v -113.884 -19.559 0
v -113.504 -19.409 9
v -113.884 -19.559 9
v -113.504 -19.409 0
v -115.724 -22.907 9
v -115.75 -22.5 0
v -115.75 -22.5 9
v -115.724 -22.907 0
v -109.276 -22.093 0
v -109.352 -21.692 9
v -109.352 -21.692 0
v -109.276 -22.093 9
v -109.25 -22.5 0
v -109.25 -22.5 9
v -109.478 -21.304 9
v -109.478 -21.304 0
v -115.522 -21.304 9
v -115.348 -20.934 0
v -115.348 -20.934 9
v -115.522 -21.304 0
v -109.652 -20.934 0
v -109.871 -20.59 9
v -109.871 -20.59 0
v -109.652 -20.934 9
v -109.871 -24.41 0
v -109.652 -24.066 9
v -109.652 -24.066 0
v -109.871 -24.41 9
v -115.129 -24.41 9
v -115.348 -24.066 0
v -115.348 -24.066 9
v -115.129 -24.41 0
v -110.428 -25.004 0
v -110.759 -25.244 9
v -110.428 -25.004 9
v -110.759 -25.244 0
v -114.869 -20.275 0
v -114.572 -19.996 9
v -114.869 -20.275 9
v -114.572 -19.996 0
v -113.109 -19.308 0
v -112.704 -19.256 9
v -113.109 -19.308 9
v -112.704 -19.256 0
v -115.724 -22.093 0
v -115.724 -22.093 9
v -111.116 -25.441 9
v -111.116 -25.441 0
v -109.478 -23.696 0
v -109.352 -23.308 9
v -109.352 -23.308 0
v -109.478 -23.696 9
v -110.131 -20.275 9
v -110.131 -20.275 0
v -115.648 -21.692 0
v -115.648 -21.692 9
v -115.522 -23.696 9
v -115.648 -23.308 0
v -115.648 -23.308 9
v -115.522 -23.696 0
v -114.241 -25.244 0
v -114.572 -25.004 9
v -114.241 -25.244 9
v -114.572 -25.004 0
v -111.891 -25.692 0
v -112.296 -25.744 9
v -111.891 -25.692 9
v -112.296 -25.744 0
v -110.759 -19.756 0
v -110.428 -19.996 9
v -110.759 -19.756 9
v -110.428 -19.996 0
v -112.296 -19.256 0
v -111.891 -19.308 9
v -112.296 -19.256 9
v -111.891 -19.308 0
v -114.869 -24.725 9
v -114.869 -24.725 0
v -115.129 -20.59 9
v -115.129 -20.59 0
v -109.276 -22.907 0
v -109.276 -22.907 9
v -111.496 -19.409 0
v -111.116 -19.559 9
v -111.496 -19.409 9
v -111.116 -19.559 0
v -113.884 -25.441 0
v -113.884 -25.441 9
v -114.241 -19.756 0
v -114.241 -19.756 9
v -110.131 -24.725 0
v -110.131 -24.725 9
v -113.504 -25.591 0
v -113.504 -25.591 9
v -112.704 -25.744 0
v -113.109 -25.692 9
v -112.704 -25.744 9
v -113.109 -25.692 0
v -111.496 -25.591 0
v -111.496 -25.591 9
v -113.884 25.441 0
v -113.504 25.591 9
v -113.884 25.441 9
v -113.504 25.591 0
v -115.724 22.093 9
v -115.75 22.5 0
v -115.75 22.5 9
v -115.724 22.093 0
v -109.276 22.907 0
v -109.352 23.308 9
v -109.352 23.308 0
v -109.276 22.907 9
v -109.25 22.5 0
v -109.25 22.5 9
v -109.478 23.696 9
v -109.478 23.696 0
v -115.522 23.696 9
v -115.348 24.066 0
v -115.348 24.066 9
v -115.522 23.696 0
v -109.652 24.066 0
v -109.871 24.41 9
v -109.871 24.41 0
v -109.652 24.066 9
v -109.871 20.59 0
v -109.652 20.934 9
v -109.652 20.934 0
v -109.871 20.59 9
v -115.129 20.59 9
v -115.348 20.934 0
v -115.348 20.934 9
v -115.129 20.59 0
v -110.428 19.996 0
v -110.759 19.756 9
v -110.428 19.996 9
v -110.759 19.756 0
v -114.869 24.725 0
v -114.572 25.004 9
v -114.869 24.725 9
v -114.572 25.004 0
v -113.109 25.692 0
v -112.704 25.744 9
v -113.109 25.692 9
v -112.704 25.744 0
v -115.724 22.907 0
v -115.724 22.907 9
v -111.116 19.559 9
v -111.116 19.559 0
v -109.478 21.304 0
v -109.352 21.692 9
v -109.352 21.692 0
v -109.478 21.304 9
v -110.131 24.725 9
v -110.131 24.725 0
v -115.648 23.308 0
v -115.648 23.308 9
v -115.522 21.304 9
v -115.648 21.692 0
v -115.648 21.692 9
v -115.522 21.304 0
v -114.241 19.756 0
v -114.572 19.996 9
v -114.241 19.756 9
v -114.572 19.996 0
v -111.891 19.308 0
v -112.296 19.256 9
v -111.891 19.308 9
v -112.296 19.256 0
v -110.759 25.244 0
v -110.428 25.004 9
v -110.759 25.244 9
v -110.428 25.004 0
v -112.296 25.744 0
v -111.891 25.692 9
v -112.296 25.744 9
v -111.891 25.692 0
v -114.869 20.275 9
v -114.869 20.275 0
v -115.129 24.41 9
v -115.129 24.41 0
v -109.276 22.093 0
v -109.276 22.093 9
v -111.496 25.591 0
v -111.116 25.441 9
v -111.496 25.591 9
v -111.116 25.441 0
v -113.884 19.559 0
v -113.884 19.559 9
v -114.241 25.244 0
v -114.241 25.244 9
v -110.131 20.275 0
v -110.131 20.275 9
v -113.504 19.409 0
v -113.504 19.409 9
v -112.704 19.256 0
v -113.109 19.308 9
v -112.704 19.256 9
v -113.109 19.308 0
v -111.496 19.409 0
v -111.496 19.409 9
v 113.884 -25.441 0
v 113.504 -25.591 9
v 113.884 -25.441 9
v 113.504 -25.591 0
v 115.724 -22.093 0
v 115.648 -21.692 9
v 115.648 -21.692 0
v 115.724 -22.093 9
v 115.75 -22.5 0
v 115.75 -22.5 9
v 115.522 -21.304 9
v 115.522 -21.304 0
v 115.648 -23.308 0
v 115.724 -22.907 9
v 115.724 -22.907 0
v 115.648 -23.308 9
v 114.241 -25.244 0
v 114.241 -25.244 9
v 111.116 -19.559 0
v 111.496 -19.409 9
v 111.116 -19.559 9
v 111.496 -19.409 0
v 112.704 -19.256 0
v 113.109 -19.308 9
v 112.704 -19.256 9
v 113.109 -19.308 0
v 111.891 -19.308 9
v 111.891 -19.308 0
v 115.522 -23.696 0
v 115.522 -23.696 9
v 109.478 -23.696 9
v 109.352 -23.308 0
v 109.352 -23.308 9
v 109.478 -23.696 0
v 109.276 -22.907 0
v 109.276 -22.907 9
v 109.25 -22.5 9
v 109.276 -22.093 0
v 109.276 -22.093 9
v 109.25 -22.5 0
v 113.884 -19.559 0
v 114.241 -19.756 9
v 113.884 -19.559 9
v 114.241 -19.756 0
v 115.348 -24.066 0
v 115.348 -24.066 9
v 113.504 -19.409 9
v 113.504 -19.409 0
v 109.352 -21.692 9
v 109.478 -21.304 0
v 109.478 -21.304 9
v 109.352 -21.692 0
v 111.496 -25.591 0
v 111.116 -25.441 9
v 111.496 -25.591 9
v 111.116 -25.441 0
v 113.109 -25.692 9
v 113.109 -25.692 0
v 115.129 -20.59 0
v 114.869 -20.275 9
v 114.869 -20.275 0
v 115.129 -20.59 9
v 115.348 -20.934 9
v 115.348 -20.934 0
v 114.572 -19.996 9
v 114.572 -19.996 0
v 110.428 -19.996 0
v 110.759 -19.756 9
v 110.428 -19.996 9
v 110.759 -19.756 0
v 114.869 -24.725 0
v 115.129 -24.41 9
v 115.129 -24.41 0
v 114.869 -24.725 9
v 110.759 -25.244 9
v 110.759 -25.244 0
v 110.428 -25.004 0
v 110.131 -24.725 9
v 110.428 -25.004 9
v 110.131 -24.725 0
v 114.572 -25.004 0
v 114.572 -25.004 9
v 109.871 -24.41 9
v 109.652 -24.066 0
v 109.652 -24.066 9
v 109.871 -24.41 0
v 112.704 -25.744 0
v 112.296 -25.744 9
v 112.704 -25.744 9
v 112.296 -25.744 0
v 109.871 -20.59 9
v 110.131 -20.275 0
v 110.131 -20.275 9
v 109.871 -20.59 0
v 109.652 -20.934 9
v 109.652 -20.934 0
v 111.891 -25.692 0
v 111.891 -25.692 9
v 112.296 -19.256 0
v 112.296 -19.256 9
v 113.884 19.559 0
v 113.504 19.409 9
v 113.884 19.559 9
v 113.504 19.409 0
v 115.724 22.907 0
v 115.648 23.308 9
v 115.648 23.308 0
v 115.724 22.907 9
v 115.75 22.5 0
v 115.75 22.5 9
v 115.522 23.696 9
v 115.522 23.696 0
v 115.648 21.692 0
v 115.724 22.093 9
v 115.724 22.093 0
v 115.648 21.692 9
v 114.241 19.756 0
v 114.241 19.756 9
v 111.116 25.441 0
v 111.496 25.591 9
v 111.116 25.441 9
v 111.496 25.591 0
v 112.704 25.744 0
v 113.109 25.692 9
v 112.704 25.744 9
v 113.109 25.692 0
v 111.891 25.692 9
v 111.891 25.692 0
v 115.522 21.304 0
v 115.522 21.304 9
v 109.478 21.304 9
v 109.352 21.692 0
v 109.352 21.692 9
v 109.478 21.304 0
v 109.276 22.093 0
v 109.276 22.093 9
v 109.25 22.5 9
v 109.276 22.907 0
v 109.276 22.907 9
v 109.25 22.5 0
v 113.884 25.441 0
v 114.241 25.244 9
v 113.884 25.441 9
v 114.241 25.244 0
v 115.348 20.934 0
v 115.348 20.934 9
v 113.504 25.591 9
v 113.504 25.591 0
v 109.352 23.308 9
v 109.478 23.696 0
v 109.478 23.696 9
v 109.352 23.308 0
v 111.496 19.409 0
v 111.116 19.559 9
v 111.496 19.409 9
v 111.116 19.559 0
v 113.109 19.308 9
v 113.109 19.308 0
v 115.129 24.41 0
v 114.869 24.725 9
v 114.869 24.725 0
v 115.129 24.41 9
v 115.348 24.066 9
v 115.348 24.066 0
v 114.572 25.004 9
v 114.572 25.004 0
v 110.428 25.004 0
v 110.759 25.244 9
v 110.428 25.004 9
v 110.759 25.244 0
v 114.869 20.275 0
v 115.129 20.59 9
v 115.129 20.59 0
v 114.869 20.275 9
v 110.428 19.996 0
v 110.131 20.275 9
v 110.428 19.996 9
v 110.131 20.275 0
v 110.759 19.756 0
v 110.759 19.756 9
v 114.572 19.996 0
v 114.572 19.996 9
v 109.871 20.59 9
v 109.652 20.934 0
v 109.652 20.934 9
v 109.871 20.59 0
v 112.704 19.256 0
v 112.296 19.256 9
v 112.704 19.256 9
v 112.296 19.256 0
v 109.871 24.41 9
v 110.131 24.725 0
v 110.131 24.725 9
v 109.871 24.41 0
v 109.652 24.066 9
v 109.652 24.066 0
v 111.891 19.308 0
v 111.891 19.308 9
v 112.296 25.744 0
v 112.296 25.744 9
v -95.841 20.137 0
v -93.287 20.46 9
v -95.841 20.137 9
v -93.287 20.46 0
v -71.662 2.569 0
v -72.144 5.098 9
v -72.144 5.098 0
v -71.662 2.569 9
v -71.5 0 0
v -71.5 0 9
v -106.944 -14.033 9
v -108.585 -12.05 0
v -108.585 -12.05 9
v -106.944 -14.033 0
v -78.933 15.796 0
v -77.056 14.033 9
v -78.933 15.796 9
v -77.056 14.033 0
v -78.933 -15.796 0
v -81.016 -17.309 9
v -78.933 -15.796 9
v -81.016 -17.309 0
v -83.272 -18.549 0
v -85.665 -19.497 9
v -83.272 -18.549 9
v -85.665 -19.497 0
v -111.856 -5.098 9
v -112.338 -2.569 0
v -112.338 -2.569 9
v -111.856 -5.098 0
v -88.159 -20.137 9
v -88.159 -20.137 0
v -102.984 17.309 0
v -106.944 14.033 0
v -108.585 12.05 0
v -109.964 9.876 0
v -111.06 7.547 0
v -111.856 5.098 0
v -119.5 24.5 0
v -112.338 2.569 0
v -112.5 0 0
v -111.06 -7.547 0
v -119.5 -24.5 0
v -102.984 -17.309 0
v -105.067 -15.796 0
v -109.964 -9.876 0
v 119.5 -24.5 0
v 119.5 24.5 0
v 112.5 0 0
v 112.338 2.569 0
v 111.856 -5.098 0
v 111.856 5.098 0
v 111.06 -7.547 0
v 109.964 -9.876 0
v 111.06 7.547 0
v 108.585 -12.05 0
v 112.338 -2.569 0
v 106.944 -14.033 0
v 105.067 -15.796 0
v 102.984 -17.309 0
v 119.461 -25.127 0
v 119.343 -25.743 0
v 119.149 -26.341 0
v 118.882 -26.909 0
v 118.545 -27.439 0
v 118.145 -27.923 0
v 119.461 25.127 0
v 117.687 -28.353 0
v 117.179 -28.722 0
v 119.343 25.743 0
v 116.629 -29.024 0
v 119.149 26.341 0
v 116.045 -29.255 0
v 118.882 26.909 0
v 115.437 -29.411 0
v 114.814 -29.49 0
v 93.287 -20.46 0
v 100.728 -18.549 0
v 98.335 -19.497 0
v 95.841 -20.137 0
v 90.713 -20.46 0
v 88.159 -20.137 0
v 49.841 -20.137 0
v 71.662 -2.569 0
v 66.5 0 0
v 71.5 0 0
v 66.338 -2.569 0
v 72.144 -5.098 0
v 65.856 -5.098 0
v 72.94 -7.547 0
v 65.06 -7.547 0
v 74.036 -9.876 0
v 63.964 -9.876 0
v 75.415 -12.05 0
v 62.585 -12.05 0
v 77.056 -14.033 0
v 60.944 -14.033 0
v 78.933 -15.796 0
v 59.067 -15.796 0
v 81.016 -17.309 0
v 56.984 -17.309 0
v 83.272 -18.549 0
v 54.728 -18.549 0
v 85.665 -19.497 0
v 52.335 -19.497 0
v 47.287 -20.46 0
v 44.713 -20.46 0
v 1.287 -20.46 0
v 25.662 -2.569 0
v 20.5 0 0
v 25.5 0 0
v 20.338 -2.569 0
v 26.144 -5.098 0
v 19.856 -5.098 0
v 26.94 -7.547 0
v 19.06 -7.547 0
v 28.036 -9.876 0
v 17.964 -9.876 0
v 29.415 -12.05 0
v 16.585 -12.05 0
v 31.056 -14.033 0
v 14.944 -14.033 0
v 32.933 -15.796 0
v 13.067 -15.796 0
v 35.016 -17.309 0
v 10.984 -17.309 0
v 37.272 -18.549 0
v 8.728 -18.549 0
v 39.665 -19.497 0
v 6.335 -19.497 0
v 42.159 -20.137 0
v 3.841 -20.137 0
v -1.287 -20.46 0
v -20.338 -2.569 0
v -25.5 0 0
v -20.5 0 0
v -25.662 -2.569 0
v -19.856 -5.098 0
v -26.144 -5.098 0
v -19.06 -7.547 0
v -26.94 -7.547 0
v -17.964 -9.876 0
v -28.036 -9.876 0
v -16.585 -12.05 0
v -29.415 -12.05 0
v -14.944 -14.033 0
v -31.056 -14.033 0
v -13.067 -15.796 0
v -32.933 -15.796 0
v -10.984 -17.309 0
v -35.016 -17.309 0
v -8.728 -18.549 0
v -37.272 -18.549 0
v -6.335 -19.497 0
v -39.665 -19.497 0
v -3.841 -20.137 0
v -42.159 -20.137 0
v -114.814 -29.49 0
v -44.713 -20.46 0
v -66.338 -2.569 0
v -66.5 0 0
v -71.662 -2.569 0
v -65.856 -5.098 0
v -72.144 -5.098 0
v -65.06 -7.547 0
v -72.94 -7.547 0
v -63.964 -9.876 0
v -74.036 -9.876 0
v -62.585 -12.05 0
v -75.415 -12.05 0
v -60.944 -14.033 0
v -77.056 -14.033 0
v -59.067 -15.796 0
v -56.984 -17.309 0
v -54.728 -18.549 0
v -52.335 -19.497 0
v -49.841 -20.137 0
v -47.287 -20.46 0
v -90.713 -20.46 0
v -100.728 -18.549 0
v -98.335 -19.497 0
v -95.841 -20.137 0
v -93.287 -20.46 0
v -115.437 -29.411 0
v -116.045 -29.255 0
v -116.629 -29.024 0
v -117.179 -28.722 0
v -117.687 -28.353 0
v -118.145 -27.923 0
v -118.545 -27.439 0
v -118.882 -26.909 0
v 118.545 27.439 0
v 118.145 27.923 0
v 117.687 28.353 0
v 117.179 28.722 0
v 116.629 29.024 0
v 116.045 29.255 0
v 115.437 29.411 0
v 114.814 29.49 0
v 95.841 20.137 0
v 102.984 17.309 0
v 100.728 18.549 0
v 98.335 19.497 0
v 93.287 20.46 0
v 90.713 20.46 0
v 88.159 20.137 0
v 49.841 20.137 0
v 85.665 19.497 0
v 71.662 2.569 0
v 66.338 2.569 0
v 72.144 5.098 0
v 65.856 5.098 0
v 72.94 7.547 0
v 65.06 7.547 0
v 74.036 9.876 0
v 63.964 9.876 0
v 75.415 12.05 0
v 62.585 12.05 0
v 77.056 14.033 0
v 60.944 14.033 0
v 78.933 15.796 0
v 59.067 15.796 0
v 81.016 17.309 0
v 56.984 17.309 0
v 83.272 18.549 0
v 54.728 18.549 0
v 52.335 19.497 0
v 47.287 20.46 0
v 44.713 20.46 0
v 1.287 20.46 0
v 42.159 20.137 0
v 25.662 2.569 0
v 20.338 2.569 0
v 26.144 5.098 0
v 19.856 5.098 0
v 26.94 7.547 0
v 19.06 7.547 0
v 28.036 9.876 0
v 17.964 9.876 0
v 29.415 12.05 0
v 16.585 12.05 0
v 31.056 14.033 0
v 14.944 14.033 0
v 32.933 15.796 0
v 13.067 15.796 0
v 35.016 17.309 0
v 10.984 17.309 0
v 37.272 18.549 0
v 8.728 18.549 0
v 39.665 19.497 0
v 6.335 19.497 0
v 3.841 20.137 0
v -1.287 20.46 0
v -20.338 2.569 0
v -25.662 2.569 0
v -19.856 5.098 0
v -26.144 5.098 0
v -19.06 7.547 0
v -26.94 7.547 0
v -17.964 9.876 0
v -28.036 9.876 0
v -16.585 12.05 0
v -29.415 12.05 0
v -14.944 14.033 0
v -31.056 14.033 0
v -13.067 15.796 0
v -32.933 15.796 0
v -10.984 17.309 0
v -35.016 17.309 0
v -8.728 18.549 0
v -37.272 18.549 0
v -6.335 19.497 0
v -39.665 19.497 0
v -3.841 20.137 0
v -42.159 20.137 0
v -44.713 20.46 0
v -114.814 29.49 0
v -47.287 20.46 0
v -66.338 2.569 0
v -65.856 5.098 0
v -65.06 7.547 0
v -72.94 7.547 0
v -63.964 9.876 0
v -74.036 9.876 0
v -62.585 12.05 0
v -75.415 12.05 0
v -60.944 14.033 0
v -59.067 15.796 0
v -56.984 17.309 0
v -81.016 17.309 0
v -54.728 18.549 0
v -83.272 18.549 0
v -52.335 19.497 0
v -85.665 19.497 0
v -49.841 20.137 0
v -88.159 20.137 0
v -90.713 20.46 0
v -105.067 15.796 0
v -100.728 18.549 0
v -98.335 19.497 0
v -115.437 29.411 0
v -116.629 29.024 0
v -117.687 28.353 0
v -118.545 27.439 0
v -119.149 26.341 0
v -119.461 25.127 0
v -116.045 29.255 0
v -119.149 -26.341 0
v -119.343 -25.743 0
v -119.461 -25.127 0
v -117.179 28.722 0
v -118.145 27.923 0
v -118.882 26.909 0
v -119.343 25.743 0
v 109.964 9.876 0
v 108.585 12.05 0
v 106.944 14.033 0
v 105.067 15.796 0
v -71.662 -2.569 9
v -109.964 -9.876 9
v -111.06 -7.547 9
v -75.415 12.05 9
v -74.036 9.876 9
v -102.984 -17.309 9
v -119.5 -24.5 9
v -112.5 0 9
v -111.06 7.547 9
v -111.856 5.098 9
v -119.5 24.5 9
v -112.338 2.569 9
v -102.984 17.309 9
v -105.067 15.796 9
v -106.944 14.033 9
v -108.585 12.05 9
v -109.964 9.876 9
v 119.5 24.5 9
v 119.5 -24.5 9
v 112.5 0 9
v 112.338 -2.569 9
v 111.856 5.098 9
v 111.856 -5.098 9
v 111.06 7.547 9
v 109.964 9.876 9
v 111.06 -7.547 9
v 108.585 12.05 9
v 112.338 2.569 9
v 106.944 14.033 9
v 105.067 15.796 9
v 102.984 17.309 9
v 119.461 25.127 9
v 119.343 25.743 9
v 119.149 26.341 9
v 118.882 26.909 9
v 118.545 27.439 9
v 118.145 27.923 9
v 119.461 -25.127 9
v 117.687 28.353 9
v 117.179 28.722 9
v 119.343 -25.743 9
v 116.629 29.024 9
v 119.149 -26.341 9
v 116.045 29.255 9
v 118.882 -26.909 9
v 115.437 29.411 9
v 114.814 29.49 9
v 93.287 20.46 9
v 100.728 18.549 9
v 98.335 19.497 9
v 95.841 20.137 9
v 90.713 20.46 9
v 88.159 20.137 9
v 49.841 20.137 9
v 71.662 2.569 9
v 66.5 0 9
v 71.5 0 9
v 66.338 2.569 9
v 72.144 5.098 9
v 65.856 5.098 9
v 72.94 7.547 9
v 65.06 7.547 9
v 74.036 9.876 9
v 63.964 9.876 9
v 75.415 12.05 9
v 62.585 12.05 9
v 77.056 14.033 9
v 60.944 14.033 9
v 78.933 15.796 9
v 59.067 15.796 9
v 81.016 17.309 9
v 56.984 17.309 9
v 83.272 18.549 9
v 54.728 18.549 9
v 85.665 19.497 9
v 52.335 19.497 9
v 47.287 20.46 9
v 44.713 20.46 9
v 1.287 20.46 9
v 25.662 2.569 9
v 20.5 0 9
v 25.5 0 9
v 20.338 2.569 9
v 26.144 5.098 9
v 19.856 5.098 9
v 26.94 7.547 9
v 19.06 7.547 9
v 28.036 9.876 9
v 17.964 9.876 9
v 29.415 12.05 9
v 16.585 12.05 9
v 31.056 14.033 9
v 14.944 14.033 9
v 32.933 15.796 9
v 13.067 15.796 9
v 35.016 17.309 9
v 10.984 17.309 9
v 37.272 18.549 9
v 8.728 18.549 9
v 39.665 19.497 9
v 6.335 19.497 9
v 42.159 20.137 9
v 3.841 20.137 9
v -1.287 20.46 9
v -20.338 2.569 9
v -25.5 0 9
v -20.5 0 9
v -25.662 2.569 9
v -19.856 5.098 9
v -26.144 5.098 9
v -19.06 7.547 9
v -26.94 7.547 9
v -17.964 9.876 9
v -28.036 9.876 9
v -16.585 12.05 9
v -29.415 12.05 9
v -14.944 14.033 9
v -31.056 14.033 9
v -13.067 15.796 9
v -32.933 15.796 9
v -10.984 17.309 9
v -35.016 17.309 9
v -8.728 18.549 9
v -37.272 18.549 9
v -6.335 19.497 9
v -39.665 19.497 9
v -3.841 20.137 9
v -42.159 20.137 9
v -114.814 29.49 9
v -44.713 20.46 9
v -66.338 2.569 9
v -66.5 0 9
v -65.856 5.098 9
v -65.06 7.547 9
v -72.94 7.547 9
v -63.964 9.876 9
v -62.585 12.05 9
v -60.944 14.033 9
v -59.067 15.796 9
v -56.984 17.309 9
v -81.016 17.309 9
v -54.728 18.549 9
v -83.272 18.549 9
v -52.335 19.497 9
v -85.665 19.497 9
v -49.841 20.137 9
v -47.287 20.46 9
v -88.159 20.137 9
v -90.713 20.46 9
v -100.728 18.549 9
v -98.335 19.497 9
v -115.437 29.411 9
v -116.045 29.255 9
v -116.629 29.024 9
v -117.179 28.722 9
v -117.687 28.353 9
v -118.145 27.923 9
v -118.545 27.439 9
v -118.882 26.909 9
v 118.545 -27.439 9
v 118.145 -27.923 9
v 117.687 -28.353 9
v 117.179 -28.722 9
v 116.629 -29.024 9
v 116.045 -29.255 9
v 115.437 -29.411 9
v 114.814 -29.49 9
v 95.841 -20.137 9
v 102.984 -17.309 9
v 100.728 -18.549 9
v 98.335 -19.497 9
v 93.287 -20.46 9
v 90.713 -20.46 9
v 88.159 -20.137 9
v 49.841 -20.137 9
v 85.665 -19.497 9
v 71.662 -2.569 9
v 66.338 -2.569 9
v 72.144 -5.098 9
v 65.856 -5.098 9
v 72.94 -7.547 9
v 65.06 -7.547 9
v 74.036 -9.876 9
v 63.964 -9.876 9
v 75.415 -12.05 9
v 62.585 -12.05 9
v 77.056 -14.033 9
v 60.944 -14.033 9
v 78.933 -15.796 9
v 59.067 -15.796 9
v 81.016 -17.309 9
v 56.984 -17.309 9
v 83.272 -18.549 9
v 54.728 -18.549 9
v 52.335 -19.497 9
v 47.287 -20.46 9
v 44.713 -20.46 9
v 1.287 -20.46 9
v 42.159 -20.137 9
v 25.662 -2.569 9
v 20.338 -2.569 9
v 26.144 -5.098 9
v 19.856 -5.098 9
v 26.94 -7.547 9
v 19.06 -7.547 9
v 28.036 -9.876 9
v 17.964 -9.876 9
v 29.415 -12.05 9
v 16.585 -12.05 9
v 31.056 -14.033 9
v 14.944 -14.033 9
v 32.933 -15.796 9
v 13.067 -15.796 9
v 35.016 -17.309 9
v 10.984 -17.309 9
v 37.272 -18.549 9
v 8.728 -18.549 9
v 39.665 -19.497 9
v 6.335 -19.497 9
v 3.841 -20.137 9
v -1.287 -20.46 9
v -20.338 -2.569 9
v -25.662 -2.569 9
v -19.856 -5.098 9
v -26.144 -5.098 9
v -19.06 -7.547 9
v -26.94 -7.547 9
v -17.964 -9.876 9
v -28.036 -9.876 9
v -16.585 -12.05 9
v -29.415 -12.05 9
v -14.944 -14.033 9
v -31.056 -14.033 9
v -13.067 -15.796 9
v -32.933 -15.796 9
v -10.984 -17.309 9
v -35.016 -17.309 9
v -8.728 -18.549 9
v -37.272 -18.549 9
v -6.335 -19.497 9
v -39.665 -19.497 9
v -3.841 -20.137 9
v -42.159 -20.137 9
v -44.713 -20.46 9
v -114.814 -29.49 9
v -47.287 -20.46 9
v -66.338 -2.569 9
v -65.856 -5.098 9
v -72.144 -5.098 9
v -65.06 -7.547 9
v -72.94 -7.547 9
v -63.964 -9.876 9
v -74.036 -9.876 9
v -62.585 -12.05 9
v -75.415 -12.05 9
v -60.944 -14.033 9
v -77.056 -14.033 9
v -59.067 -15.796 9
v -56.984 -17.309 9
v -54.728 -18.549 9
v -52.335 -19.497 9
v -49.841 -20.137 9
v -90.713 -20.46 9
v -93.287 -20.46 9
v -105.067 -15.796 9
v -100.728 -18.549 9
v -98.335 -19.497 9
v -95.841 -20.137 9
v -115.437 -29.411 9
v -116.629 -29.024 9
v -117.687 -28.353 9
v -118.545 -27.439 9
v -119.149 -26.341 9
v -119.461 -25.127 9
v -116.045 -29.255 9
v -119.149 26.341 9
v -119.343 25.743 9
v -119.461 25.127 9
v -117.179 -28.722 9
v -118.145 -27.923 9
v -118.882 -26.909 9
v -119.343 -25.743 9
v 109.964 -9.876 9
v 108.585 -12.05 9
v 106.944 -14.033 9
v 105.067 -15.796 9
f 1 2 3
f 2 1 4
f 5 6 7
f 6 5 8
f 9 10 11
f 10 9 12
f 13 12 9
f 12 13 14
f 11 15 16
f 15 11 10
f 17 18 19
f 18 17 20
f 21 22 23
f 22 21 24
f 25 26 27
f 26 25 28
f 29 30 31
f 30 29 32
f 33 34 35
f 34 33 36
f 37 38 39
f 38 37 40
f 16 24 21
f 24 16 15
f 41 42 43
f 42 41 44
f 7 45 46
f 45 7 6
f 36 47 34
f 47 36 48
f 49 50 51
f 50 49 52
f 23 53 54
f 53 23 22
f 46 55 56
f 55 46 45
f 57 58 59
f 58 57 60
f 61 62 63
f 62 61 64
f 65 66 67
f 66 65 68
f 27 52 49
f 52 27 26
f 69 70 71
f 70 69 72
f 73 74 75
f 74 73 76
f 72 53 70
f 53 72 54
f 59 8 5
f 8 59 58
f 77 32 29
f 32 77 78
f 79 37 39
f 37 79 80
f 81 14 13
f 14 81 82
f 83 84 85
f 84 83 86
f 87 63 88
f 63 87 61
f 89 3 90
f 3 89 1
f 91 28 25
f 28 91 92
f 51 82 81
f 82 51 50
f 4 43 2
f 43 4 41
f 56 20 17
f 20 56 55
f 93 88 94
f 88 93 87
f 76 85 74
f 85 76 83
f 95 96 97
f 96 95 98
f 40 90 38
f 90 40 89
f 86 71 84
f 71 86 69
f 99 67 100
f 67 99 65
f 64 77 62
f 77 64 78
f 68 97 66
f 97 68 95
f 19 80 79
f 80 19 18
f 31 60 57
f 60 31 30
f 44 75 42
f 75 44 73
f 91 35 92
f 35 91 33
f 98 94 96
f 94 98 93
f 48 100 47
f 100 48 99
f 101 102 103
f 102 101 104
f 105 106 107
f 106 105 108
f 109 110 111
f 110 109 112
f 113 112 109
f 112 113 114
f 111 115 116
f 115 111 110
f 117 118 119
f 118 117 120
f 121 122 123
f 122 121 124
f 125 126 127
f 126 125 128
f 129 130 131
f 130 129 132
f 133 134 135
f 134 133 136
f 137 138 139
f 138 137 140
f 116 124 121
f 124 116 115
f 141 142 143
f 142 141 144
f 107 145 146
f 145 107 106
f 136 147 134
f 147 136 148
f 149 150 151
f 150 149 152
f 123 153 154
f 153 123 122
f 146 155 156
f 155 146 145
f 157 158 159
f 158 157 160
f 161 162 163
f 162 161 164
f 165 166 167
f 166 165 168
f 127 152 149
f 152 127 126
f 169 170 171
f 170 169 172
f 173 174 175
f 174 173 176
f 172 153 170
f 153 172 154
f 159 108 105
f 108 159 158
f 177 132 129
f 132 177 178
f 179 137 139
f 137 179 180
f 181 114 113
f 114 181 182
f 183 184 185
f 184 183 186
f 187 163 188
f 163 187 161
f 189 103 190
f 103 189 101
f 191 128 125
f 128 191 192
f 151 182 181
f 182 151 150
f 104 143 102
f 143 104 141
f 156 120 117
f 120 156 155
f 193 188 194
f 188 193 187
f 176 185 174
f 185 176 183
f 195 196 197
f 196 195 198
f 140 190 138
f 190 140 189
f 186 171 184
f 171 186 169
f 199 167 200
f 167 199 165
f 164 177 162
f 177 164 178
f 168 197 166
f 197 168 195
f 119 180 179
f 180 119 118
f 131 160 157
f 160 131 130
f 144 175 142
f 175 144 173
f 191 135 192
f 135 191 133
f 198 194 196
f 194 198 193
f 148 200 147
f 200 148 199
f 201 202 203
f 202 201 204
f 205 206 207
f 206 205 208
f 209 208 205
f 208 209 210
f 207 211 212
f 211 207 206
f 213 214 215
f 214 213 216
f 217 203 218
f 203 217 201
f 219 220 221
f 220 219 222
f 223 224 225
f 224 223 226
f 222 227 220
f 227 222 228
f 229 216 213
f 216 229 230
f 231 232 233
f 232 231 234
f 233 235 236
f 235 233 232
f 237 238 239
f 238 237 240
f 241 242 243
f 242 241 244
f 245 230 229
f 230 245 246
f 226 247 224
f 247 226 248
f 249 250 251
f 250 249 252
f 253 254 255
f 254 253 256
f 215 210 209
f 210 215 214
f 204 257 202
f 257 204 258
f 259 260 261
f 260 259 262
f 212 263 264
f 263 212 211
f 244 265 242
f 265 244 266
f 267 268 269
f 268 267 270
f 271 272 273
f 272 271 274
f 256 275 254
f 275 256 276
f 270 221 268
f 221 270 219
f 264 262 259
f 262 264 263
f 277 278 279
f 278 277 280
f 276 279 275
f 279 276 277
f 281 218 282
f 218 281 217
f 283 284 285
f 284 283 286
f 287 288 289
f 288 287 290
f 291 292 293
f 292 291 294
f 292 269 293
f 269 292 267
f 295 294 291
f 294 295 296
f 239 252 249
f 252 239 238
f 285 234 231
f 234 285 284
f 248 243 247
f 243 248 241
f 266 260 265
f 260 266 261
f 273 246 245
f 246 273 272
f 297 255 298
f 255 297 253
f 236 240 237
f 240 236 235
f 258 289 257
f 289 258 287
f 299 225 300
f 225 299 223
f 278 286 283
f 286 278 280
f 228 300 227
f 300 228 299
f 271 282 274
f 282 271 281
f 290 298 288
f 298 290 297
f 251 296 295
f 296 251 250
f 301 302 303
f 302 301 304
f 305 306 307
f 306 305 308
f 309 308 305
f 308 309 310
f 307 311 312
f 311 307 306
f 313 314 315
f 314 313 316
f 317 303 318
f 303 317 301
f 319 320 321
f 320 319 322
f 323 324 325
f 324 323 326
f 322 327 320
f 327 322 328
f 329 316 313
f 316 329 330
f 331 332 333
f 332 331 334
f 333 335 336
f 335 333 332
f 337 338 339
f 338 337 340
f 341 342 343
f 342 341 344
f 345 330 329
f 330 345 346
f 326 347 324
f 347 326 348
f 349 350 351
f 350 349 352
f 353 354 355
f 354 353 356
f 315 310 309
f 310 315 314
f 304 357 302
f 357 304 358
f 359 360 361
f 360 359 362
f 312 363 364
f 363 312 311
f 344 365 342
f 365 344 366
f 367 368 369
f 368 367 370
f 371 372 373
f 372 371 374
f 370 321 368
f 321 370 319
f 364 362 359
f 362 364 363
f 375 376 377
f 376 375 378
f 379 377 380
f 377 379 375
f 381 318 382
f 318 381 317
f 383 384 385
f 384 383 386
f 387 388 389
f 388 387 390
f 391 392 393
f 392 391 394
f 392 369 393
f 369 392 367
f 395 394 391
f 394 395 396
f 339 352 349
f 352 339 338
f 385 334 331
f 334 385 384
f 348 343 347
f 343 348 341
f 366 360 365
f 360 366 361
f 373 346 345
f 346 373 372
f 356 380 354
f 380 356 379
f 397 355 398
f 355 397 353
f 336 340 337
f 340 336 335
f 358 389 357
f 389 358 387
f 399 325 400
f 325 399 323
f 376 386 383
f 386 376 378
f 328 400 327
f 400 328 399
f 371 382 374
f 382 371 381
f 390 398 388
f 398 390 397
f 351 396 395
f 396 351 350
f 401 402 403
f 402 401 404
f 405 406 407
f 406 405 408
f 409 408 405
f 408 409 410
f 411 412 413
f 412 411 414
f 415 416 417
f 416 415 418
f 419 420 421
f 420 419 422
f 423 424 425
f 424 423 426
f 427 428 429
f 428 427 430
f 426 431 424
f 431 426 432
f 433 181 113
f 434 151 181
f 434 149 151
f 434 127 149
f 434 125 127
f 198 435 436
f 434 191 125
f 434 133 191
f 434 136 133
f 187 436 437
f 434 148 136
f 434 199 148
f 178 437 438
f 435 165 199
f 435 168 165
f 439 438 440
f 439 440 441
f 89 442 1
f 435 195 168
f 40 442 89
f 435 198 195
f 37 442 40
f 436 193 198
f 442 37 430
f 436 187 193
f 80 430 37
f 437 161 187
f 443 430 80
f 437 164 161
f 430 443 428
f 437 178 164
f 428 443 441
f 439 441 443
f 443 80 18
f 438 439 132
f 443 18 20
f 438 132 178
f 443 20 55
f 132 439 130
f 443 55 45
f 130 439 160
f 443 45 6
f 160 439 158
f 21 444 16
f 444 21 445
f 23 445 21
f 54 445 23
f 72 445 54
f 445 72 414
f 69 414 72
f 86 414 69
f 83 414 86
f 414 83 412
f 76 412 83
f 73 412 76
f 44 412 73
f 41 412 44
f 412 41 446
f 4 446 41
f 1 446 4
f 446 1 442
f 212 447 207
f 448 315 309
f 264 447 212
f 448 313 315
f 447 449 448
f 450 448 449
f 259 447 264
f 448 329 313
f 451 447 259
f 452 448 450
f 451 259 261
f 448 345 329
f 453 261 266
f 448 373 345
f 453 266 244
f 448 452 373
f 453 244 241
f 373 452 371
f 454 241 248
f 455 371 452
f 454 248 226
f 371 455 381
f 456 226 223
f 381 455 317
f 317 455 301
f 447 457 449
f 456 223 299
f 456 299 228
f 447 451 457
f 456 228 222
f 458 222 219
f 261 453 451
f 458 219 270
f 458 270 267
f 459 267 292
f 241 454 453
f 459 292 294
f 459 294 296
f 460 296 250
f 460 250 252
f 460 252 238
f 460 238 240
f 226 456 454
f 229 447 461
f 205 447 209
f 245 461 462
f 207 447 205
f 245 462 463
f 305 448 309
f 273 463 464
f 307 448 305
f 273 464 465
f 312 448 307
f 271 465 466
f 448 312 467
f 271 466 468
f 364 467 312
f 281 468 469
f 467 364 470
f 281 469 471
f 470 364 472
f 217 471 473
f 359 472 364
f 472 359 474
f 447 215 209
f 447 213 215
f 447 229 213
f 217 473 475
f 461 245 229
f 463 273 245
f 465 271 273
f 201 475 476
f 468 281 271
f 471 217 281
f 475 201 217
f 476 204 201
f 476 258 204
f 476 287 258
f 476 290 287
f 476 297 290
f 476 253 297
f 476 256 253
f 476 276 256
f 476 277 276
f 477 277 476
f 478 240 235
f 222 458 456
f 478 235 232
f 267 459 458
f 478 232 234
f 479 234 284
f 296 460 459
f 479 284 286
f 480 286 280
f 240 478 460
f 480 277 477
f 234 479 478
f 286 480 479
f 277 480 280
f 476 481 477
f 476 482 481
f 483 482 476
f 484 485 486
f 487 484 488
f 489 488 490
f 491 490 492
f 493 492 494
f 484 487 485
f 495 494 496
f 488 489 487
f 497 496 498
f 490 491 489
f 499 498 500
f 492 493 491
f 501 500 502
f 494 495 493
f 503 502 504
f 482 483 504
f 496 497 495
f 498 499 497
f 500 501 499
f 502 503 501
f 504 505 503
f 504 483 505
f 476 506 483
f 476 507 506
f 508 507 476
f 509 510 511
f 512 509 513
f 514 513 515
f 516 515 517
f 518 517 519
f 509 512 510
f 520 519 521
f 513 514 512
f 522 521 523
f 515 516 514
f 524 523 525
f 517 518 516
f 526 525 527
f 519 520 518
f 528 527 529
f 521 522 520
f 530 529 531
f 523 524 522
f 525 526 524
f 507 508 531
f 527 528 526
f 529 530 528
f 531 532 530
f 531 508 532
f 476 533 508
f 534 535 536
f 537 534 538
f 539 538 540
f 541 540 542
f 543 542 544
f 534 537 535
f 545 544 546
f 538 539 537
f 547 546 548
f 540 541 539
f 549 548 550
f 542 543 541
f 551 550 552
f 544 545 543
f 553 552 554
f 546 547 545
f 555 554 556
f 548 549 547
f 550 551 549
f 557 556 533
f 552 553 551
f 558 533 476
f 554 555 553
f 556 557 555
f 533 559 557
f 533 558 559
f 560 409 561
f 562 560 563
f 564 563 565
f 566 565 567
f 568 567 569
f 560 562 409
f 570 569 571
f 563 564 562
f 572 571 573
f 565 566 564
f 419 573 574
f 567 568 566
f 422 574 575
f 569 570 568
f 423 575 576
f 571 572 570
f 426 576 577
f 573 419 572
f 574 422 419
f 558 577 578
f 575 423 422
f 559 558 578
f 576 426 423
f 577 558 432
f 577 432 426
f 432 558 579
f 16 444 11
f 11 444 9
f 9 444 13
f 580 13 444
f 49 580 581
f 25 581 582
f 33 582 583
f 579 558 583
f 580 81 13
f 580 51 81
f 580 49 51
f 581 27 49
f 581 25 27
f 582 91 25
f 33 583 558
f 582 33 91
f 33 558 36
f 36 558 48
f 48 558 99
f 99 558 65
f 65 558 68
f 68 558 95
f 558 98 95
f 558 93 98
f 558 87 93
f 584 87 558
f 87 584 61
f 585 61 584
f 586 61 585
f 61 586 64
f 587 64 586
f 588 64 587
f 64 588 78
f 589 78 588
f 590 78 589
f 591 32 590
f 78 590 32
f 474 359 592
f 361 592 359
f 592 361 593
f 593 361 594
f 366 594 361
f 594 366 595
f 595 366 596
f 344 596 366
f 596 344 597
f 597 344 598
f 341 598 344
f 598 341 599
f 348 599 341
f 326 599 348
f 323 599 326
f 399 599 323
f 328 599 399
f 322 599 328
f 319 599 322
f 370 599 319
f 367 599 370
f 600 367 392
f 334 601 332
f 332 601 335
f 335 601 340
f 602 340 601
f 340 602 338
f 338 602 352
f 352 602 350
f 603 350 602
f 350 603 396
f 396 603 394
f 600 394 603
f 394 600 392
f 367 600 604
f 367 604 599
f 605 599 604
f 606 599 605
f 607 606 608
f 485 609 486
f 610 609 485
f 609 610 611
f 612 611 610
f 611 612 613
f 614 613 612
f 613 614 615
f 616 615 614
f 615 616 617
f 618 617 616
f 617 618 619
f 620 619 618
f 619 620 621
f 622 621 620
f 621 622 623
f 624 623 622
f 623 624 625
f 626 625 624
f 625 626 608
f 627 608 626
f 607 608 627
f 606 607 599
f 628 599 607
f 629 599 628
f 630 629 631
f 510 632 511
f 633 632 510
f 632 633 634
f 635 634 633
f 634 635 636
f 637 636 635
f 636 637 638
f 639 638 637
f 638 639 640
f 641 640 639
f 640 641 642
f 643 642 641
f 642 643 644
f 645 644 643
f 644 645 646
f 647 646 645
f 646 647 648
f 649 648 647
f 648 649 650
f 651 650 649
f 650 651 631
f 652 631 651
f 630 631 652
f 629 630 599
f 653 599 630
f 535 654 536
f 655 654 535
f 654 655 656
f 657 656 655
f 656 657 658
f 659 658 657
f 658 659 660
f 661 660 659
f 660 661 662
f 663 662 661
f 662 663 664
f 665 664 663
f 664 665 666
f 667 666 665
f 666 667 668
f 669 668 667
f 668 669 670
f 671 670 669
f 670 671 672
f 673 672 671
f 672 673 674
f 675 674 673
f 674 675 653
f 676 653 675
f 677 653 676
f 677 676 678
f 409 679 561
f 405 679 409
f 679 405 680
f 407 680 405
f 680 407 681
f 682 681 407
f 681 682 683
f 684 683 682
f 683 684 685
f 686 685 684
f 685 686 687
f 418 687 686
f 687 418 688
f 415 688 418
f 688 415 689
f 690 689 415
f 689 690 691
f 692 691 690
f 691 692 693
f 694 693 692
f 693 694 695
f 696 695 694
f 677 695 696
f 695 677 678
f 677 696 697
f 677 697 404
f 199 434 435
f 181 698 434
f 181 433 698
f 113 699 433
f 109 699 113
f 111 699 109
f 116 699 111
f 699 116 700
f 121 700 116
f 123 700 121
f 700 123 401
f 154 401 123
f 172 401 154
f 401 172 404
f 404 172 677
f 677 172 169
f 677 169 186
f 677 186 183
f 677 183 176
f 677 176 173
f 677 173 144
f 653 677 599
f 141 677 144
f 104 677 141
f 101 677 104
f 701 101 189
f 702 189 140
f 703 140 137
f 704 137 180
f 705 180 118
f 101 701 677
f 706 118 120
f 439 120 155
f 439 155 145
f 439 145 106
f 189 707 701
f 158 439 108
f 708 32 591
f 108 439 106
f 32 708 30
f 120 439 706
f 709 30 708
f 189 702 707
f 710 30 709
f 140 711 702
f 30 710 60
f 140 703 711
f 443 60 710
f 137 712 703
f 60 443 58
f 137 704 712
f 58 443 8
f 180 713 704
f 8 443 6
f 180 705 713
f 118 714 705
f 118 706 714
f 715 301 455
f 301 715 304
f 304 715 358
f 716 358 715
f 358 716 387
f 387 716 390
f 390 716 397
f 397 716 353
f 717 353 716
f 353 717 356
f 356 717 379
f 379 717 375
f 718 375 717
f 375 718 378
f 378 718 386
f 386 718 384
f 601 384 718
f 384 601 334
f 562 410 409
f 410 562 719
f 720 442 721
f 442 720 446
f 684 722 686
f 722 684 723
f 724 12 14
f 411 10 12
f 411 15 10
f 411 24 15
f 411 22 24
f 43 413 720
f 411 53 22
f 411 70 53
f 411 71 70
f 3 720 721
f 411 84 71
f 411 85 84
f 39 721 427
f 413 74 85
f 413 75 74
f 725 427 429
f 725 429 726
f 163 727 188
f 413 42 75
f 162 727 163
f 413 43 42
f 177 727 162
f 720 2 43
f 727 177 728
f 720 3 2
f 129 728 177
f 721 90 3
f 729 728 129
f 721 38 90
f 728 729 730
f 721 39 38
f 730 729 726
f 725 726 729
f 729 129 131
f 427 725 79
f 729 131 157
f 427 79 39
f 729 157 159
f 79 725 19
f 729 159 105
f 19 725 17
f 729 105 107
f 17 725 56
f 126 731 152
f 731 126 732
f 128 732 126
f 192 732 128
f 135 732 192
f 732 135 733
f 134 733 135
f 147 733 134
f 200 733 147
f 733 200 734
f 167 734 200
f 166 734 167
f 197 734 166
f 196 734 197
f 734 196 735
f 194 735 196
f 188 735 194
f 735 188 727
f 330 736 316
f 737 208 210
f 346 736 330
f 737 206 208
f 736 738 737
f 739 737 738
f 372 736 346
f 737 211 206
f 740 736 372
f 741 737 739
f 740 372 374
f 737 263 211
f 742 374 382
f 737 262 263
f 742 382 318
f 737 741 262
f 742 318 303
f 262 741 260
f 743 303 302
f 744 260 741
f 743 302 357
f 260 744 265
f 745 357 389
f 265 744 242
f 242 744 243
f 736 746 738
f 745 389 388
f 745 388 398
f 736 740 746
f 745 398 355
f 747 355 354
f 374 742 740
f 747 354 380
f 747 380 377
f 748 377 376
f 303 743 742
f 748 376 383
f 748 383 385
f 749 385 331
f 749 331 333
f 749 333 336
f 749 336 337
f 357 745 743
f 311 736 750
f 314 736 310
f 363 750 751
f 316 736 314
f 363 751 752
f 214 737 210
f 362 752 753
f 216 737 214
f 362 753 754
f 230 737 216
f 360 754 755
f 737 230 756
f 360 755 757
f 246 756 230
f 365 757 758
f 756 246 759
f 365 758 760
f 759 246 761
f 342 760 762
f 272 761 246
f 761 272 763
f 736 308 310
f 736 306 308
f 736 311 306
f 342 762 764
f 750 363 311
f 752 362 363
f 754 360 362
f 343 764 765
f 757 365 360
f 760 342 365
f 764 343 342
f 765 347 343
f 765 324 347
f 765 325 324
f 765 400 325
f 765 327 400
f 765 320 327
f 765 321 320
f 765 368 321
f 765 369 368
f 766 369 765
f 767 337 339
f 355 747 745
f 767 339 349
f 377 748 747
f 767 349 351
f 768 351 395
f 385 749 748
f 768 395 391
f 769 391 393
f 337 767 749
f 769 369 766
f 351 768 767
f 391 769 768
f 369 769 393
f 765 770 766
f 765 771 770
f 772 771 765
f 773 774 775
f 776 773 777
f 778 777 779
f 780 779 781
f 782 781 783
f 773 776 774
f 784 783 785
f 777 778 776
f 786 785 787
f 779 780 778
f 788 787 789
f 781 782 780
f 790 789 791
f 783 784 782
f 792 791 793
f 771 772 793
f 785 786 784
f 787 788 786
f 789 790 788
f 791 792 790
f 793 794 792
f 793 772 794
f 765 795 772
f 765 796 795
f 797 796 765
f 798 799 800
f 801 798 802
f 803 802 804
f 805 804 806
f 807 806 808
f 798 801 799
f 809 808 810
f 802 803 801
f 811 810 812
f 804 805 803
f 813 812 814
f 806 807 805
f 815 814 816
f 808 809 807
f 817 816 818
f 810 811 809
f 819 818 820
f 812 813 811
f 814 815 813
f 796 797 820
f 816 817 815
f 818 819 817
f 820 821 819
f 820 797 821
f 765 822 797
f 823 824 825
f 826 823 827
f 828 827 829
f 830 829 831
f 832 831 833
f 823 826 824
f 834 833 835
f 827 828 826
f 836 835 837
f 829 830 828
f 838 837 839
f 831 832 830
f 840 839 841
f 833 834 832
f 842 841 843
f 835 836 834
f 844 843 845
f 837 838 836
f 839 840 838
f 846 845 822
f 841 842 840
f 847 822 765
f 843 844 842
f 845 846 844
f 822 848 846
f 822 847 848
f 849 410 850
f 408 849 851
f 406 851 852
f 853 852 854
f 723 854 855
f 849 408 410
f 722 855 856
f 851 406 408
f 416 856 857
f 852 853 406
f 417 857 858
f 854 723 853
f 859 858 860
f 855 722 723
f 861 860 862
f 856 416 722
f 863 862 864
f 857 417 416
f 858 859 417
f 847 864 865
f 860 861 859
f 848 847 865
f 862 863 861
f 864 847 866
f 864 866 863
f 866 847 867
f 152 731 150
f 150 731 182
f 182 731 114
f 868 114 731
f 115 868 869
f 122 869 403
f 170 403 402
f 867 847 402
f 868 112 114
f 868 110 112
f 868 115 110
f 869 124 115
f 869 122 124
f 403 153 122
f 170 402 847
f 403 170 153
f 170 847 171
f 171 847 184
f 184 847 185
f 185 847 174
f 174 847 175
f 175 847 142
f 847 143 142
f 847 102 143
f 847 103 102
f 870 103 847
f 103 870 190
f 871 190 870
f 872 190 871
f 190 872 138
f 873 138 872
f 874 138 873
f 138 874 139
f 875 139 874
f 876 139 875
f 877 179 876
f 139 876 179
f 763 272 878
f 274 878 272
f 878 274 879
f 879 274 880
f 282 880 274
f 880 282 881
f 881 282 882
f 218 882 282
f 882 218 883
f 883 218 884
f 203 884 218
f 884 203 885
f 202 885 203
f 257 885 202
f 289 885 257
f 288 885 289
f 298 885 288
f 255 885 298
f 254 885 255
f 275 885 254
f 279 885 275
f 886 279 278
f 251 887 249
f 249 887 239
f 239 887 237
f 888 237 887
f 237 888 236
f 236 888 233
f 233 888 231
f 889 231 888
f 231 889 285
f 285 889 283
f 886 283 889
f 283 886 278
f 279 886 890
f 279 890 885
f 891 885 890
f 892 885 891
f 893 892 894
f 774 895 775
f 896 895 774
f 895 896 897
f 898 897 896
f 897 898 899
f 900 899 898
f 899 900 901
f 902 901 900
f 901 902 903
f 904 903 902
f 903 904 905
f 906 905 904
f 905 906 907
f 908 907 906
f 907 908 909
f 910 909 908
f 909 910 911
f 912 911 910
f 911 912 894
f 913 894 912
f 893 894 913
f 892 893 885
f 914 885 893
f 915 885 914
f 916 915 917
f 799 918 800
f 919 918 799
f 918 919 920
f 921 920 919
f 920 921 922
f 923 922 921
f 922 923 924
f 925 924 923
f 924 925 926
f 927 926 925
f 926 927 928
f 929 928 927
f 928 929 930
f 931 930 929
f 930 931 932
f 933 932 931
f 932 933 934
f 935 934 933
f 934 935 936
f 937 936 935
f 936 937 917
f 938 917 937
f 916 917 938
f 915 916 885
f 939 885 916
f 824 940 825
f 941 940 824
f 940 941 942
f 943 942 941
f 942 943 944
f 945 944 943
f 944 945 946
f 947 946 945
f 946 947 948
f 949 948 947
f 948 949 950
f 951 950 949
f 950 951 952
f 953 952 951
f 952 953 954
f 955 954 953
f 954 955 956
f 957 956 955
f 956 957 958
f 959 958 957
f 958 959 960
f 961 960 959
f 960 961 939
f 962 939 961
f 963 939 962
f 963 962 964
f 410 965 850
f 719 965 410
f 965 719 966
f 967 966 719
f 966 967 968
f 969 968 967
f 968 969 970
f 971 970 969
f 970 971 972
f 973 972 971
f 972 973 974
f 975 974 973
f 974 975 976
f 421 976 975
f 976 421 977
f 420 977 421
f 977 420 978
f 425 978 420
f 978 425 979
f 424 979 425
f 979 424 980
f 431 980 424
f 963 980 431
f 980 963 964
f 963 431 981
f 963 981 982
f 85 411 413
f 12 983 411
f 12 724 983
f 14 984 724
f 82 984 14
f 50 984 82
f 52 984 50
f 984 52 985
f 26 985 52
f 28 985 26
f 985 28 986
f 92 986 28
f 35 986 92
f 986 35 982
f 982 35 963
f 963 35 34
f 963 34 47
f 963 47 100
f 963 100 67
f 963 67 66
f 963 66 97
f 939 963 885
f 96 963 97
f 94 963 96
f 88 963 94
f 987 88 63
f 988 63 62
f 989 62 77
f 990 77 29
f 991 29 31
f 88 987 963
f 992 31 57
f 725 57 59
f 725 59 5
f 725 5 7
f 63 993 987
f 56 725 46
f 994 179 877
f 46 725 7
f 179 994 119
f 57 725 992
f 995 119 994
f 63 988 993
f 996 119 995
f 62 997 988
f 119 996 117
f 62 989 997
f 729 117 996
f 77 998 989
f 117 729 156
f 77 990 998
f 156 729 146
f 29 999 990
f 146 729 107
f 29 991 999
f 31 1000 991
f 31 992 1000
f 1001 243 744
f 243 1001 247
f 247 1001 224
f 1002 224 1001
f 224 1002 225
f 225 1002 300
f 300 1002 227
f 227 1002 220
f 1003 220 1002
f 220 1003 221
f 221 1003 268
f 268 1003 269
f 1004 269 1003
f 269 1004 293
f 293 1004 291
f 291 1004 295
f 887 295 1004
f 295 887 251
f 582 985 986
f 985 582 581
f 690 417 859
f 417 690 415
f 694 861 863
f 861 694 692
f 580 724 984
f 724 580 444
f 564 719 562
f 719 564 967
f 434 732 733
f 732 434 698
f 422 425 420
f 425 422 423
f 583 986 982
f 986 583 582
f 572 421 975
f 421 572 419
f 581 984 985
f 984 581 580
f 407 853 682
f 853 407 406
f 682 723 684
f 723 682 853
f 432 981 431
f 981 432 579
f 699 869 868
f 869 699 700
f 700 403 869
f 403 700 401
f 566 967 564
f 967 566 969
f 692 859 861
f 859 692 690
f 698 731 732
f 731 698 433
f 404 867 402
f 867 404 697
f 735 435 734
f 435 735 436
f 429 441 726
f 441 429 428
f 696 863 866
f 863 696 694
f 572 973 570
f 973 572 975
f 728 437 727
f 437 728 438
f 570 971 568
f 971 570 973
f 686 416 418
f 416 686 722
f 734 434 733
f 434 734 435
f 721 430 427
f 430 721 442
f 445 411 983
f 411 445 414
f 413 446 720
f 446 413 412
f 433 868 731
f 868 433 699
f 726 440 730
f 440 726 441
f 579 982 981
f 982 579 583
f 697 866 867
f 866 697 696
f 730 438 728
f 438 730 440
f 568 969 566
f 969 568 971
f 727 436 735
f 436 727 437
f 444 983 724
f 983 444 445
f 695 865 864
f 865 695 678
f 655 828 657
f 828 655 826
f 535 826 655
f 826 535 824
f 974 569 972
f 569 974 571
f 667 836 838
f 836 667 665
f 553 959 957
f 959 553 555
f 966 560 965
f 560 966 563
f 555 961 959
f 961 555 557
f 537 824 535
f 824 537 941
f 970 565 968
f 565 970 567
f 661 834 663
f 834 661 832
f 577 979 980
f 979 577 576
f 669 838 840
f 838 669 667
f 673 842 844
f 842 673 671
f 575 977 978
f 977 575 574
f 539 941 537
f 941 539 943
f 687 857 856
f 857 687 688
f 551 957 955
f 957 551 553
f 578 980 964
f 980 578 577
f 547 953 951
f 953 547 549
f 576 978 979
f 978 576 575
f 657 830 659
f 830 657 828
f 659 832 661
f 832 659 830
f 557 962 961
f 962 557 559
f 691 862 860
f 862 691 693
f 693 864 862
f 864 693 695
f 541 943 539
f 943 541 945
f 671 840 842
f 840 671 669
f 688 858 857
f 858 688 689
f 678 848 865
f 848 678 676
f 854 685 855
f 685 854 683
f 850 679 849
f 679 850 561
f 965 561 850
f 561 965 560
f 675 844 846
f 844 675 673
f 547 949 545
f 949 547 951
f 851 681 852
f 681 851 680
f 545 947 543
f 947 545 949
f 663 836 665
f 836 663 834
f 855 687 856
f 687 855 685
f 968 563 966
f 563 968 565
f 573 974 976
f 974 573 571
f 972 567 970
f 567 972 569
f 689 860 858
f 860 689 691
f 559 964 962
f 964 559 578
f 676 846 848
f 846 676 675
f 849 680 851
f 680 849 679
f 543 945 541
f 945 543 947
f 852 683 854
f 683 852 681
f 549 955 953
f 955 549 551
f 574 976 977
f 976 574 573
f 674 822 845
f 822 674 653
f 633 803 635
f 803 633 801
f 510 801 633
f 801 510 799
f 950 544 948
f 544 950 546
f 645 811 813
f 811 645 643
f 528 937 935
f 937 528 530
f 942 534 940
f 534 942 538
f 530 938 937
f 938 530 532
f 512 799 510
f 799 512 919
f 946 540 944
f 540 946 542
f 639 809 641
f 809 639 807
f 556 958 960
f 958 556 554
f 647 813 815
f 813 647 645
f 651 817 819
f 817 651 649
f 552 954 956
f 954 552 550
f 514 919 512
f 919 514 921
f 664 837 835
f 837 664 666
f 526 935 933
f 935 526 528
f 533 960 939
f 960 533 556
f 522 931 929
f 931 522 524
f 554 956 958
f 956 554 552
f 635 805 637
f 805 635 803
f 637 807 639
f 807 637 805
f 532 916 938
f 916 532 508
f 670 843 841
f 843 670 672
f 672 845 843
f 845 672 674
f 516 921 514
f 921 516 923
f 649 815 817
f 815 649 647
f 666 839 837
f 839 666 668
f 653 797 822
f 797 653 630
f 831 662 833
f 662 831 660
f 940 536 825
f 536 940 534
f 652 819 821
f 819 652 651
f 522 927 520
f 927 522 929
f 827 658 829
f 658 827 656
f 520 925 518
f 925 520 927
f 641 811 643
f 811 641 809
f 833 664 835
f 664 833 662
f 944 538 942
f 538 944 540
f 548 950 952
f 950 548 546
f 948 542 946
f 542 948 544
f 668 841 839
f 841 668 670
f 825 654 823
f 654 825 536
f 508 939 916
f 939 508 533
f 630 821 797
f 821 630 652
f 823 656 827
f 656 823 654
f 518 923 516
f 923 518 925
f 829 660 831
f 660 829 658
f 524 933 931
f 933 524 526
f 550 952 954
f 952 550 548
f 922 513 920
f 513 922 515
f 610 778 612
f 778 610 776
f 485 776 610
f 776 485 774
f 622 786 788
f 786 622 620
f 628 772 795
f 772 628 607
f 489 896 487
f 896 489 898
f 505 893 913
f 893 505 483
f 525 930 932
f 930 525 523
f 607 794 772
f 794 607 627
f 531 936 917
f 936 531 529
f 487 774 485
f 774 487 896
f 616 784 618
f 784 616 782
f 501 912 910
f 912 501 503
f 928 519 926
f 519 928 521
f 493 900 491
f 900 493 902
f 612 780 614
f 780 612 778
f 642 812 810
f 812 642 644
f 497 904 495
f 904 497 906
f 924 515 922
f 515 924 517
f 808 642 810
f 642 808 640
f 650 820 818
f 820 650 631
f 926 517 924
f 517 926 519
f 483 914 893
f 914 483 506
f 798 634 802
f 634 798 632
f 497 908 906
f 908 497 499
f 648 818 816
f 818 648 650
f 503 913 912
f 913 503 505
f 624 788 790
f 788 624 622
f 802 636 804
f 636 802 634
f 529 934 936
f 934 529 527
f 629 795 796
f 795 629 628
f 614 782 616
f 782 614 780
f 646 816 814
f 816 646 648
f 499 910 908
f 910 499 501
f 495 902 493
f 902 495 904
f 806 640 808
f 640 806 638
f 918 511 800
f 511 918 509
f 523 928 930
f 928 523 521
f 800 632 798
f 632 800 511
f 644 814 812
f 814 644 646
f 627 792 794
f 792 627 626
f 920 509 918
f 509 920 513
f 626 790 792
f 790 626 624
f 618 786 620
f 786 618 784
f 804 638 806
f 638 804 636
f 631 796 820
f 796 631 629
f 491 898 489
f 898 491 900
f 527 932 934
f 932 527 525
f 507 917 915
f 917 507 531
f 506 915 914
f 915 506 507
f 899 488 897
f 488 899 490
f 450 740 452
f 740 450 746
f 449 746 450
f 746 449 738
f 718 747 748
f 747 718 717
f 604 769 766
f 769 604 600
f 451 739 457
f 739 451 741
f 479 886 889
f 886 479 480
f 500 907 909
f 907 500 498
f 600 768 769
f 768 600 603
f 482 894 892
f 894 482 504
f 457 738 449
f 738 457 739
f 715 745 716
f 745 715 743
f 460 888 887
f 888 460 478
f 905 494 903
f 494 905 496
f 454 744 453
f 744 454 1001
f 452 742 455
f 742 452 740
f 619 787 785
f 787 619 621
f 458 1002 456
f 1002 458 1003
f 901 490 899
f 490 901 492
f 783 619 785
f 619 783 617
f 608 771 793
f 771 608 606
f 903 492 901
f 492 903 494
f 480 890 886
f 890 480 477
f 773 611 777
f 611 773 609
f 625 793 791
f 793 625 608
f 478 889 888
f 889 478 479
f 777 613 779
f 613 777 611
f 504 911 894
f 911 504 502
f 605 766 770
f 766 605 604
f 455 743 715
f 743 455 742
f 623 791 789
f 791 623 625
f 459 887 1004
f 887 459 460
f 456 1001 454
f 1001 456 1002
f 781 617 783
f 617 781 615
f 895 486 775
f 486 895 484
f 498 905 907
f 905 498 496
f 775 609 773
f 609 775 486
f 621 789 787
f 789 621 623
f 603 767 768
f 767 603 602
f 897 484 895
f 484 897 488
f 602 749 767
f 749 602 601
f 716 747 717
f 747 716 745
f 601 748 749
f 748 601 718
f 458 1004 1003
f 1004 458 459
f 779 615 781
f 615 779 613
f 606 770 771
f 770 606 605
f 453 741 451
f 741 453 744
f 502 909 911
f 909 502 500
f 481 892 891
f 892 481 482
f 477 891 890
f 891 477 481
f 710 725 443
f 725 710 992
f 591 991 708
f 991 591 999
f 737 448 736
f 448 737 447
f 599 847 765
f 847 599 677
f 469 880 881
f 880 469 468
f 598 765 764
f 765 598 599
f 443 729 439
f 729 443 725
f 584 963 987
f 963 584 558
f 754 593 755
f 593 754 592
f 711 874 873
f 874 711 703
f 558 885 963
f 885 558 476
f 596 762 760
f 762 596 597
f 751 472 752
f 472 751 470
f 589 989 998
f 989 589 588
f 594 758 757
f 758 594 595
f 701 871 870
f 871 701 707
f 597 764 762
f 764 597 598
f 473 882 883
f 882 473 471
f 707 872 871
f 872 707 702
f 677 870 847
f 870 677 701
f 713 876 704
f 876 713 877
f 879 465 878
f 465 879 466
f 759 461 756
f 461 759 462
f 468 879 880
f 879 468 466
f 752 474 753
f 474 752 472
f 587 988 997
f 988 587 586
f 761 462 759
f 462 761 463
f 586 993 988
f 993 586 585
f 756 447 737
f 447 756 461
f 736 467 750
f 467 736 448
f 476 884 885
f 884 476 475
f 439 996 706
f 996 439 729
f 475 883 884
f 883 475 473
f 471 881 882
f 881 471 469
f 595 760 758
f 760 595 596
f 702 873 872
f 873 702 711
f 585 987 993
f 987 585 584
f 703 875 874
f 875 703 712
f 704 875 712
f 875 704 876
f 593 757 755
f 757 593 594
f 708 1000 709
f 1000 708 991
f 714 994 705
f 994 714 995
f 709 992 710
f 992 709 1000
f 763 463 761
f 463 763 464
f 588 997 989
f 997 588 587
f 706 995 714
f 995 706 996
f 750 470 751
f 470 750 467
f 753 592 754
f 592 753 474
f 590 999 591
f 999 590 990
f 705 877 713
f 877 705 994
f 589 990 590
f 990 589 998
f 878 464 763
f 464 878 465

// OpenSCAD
$fn = 50;


difference() {
	union() {
		hull() {
			translate(v = [-114.5000000000, 24.5000000000, 0]) {
				cylinder(h = 9, r = 5);
			}
			translate(v = [114.5000000000, 24.5000000000, 0]) {
				cylinder(h = 9, r = 5);
			}
			translate(v = [-114.5000000000, -24.5000000000, 0]) {
				cylinder(h = 9, r = 5);
			}
			translate(v = [114.5000000000, -24.5000000000, 0]) {
				cylinder(h = 9, r = 5);
			}
		}
	}
	union() {
		#translate(v = [-112.5000000000, -22.5000000000, -100.0000000000]) {
			cylinder(h = 200, r = 3.2500000000);
		}
		#translate(v = [-112.5000000000, 22.5000000000, -100.0000000000]) {
			cylinder(h = 200, r = 3.2500000000);
		}
		#translate(v = [112.5000000000, -22.5000000000, -100.0000000000]) {
			cylinder(h = 200, r = 3.2500000000);
		}
		#translate(v = [112.5000000000, 22.5000000000, -100.0000000000]) {
			cylinder(h = 200, r = 3.2500000000);
		}
		#translate(v = [-92.0000000000, 0, 0]) {
			cylinder(h = 9, r = 20.5000000000);
		}
		#translate(v = [-46.0000000000, 0, 0]) {
			cylinder(h = 9, r = 20.5000000000);
		}
		#cylinder(h = 9, r = 20.5000000000);
		#translate(v = [46.0000000000, 0, 0]) {
			cylinder(h = 9, r = 20.5000000000);
		}
		#translate(v = [92.0000000000, 0, 0]) {
			cylinder(h = 9, r = 20.5000000000);
		}
	}
}
